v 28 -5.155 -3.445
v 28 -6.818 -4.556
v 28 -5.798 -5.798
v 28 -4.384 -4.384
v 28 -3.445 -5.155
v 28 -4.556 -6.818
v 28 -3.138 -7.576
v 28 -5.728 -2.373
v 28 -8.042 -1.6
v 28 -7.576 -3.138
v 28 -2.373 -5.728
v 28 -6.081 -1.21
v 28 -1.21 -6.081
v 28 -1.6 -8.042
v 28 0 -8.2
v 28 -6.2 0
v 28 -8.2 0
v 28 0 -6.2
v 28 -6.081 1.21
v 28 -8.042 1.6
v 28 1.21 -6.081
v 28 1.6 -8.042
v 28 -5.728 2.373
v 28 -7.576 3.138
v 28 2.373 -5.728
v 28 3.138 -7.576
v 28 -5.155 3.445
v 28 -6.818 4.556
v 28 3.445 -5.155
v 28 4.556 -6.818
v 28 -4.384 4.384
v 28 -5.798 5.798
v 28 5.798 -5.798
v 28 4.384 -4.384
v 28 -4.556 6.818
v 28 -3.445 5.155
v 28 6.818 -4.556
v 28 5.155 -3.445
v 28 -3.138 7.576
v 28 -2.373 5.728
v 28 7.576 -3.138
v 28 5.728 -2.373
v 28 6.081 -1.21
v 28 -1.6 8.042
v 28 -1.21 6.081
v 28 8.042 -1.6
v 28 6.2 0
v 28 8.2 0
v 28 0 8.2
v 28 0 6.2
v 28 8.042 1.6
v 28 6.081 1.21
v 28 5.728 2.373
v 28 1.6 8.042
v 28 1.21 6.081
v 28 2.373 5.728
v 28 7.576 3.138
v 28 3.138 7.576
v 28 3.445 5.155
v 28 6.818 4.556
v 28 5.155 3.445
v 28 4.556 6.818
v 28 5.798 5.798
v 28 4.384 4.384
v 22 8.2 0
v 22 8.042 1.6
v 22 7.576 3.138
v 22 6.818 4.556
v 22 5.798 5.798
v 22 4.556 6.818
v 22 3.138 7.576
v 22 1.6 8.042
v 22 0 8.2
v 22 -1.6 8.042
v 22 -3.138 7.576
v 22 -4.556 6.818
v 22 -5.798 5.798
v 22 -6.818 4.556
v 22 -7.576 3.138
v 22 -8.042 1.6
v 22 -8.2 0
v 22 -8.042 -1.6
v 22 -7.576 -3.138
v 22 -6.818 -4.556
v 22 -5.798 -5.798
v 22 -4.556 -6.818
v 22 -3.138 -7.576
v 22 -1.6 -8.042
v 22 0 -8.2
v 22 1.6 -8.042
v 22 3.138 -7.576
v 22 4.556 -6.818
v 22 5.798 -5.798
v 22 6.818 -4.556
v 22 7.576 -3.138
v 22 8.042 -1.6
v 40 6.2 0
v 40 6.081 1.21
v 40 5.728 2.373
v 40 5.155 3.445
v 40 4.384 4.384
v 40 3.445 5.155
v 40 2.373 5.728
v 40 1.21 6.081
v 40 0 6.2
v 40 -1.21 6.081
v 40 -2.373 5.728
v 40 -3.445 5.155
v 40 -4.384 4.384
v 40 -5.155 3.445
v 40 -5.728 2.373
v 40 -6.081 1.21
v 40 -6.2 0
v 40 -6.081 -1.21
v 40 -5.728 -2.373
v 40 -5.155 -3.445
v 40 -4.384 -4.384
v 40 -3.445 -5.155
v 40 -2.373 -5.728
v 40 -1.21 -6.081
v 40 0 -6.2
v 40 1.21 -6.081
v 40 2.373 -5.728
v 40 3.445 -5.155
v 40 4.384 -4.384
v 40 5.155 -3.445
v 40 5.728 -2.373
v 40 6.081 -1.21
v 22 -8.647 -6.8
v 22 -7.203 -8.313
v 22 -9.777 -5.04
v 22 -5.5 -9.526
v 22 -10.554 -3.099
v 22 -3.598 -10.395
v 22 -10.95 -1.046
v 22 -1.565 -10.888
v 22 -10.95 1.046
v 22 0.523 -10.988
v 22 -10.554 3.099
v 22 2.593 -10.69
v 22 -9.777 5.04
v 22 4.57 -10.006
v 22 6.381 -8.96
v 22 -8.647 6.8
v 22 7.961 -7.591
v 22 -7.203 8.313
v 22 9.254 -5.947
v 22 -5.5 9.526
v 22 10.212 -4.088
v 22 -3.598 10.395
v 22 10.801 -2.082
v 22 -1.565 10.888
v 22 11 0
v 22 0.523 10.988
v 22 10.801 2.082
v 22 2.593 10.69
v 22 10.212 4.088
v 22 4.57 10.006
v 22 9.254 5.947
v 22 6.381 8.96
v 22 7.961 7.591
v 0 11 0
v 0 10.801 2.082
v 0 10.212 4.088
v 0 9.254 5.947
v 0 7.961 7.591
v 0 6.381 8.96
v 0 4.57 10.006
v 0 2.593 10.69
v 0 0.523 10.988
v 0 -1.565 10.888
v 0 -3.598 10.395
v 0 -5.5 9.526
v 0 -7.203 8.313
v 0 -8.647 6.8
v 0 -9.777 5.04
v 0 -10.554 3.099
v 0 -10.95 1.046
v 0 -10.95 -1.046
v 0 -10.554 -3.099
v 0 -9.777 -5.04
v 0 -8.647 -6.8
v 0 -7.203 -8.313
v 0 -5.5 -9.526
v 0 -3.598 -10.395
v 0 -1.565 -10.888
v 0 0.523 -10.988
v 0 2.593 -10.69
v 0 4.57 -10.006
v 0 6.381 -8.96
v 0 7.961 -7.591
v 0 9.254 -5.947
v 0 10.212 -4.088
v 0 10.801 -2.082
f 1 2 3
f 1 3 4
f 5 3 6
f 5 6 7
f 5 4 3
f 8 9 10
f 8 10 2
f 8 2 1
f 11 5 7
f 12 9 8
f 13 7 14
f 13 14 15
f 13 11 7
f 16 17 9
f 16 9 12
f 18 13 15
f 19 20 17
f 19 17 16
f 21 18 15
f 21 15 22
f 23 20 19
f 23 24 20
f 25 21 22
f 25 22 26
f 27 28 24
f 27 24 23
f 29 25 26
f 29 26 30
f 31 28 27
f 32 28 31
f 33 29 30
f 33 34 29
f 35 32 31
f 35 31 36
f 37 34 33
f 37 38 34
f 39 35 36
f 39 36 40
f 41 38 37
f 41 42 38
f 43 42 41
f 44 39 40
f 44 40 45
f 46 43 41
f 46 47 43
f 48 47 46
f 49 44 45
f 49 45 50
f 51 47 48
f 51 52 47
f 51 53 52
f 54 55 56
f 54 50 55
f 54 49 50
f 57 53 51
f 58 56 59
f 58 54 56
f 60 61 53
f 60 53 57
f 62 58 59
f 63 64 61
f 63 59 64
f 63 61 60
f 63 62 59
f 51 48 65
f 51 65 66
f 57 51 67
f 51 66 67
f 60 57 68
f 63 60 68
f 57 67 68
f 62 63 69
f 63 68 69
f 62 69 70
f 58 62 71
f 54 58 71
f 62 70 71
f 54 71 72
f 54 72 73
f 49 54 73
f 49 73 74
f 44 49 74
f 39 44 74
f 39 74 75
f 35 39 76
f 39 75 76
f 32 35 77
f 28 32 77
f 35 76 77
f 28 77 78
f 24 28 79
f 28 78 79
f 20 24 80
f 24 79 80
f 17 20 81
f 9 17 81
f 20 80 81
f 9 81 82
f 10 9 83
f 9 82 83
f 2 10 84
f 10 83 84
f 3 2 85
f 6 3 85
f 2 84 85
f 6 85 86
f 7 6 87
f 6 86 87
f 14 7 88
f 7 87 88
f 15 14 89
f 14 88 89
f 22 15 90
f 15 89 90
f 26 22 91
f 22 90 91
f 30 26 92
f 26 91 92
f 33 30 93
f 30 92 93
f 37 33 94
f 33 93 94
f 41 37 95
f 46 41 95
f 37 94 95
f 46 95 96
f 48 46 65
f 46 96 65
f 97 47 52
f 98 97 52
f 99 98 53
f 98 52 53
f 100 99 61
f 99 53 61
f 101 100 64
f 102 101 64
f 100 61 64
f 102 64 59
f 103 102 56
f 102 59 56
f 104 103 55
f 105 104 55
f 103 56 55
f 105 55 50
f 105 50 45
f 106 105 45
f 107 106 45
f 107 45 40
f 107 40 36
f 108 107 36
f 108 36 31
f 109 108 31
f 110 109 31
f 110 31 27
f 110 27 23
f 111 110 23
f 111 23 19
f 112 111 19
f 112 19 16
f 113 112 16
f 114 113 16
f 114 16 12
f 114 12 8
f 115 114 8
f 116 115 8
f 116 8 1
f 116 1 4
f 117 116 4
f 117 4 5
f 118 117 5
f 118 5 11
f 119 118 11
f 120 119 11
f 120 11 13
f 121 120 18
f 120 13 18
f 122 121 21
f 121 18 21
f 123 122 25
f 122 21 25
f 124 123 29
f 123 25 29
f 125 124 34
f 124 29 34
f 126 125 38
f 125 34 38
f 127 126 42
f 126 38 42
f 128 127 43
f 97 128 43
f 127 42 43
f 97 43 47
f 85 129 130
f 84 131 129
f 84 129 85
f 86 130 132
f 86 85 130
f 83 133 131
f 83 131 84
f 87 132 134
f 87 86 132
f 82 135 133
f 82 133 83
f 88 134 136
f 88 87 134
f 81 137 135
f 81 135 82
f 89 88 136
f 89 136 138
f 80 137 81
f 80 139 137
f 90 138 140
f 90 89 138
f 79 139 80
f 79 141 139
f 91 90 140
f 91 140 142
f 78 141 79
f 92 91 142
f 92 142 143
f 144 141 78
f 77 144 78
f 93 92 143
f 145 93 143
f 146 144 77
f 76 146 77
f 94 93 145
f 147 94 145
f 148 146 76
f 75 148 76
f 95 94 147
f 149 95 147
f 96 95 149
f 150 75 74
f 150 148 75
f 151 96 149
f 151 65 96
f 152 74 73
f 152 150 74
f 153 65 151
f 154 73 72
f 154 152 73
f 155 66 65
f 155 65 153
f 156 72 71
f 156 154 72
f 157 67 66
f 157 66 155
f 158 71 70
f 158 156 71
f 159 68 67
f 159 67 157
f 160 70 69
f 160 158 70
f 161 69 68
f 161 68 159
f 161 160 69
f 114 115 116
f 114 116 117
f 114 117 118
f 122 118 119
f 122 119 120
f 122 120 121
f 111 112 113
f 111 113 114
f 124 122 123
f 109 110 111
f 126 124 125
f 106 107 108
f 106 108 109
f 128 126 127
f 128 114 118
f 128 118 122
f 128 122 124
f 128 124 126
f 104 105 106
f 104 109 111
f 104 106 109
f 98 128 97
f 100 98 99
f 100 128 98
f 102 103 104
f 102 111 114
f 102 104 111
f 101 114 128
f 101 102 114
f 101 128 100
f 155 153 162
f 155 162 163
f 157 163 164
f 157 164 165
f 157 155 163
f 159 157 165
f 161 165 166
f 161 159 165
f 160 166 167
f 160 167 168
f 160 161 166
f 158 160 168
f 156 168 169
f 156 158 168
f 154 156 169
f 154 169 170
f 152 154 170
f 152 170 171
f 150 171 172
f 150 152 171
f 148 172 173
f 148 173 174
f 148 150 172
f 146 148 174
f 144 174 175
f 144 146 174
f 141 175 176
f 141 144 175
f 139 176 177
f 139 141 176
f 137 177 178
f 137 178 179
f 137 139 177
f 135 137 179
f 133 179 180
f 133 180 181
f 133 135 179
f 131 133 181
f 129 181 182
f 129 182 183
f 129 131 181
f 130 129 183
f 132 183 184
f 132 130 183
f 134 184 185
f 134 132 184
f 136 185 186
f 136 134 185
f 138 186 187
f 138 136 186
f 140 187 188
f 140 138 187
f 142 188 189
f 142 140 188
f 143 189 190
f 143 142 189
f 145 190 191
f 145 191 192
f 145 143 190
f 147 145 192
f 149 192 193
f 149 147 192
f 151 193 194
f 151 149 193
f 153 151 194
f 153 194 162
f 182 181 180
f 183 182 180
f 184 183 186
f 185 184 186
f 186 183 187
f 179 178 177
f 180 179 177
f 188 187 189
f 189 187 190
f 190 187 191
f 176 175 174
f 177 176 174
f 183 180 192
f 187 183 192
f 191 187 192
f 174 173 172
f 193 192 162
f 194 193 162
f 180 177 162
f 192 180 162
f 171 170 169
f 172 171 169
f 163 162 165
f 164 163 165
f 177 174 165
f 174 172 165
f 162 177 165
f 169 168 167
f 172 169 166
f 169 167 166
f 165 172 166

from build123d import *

# Parameters (mm, degrees)
F1_R     = 11
F1_R_2   = 8.2
F1_R_3   = 6.2
F2_DEPTH = 22
F3_DEPTH = 18
F4_DEPTH = 6


with BuildPart() as f2:
    # F1 (on Right) → F2 (new body, through all)
    with BuildSketch(Plane.YZ):
        Circle(F1_R)
        Circle(F1_R_2, mode=Mode.SUBTRACT)
        Circle(F1_R_2)
        Circle(F1_R_3, mode=Mode.SUBTRACT)
        Circle(F1_R_3)
    extrude(amount=-F2_DEPTH)

    # F1 (on Right) → F3 (join, through all)
    with BuildSketch(Plane.YZ):
        Circle(F1_R_3)
    extrude(amount=F3_DEPTH)

    # F1 (on Right) → F4 (join, through all)
    with BuildSketch(Plane.YZ):
        Circle(F1_R_2)
        Circle(F1_R_3, mode=Mode.SUBTRACT)
    extrude(amount=F4_DEPTH)


with BuildPart() as f2_1:
    # F5: moved
    add(f2.part.moved(Location((22, 0, 0))))


solid = f2_1.part
